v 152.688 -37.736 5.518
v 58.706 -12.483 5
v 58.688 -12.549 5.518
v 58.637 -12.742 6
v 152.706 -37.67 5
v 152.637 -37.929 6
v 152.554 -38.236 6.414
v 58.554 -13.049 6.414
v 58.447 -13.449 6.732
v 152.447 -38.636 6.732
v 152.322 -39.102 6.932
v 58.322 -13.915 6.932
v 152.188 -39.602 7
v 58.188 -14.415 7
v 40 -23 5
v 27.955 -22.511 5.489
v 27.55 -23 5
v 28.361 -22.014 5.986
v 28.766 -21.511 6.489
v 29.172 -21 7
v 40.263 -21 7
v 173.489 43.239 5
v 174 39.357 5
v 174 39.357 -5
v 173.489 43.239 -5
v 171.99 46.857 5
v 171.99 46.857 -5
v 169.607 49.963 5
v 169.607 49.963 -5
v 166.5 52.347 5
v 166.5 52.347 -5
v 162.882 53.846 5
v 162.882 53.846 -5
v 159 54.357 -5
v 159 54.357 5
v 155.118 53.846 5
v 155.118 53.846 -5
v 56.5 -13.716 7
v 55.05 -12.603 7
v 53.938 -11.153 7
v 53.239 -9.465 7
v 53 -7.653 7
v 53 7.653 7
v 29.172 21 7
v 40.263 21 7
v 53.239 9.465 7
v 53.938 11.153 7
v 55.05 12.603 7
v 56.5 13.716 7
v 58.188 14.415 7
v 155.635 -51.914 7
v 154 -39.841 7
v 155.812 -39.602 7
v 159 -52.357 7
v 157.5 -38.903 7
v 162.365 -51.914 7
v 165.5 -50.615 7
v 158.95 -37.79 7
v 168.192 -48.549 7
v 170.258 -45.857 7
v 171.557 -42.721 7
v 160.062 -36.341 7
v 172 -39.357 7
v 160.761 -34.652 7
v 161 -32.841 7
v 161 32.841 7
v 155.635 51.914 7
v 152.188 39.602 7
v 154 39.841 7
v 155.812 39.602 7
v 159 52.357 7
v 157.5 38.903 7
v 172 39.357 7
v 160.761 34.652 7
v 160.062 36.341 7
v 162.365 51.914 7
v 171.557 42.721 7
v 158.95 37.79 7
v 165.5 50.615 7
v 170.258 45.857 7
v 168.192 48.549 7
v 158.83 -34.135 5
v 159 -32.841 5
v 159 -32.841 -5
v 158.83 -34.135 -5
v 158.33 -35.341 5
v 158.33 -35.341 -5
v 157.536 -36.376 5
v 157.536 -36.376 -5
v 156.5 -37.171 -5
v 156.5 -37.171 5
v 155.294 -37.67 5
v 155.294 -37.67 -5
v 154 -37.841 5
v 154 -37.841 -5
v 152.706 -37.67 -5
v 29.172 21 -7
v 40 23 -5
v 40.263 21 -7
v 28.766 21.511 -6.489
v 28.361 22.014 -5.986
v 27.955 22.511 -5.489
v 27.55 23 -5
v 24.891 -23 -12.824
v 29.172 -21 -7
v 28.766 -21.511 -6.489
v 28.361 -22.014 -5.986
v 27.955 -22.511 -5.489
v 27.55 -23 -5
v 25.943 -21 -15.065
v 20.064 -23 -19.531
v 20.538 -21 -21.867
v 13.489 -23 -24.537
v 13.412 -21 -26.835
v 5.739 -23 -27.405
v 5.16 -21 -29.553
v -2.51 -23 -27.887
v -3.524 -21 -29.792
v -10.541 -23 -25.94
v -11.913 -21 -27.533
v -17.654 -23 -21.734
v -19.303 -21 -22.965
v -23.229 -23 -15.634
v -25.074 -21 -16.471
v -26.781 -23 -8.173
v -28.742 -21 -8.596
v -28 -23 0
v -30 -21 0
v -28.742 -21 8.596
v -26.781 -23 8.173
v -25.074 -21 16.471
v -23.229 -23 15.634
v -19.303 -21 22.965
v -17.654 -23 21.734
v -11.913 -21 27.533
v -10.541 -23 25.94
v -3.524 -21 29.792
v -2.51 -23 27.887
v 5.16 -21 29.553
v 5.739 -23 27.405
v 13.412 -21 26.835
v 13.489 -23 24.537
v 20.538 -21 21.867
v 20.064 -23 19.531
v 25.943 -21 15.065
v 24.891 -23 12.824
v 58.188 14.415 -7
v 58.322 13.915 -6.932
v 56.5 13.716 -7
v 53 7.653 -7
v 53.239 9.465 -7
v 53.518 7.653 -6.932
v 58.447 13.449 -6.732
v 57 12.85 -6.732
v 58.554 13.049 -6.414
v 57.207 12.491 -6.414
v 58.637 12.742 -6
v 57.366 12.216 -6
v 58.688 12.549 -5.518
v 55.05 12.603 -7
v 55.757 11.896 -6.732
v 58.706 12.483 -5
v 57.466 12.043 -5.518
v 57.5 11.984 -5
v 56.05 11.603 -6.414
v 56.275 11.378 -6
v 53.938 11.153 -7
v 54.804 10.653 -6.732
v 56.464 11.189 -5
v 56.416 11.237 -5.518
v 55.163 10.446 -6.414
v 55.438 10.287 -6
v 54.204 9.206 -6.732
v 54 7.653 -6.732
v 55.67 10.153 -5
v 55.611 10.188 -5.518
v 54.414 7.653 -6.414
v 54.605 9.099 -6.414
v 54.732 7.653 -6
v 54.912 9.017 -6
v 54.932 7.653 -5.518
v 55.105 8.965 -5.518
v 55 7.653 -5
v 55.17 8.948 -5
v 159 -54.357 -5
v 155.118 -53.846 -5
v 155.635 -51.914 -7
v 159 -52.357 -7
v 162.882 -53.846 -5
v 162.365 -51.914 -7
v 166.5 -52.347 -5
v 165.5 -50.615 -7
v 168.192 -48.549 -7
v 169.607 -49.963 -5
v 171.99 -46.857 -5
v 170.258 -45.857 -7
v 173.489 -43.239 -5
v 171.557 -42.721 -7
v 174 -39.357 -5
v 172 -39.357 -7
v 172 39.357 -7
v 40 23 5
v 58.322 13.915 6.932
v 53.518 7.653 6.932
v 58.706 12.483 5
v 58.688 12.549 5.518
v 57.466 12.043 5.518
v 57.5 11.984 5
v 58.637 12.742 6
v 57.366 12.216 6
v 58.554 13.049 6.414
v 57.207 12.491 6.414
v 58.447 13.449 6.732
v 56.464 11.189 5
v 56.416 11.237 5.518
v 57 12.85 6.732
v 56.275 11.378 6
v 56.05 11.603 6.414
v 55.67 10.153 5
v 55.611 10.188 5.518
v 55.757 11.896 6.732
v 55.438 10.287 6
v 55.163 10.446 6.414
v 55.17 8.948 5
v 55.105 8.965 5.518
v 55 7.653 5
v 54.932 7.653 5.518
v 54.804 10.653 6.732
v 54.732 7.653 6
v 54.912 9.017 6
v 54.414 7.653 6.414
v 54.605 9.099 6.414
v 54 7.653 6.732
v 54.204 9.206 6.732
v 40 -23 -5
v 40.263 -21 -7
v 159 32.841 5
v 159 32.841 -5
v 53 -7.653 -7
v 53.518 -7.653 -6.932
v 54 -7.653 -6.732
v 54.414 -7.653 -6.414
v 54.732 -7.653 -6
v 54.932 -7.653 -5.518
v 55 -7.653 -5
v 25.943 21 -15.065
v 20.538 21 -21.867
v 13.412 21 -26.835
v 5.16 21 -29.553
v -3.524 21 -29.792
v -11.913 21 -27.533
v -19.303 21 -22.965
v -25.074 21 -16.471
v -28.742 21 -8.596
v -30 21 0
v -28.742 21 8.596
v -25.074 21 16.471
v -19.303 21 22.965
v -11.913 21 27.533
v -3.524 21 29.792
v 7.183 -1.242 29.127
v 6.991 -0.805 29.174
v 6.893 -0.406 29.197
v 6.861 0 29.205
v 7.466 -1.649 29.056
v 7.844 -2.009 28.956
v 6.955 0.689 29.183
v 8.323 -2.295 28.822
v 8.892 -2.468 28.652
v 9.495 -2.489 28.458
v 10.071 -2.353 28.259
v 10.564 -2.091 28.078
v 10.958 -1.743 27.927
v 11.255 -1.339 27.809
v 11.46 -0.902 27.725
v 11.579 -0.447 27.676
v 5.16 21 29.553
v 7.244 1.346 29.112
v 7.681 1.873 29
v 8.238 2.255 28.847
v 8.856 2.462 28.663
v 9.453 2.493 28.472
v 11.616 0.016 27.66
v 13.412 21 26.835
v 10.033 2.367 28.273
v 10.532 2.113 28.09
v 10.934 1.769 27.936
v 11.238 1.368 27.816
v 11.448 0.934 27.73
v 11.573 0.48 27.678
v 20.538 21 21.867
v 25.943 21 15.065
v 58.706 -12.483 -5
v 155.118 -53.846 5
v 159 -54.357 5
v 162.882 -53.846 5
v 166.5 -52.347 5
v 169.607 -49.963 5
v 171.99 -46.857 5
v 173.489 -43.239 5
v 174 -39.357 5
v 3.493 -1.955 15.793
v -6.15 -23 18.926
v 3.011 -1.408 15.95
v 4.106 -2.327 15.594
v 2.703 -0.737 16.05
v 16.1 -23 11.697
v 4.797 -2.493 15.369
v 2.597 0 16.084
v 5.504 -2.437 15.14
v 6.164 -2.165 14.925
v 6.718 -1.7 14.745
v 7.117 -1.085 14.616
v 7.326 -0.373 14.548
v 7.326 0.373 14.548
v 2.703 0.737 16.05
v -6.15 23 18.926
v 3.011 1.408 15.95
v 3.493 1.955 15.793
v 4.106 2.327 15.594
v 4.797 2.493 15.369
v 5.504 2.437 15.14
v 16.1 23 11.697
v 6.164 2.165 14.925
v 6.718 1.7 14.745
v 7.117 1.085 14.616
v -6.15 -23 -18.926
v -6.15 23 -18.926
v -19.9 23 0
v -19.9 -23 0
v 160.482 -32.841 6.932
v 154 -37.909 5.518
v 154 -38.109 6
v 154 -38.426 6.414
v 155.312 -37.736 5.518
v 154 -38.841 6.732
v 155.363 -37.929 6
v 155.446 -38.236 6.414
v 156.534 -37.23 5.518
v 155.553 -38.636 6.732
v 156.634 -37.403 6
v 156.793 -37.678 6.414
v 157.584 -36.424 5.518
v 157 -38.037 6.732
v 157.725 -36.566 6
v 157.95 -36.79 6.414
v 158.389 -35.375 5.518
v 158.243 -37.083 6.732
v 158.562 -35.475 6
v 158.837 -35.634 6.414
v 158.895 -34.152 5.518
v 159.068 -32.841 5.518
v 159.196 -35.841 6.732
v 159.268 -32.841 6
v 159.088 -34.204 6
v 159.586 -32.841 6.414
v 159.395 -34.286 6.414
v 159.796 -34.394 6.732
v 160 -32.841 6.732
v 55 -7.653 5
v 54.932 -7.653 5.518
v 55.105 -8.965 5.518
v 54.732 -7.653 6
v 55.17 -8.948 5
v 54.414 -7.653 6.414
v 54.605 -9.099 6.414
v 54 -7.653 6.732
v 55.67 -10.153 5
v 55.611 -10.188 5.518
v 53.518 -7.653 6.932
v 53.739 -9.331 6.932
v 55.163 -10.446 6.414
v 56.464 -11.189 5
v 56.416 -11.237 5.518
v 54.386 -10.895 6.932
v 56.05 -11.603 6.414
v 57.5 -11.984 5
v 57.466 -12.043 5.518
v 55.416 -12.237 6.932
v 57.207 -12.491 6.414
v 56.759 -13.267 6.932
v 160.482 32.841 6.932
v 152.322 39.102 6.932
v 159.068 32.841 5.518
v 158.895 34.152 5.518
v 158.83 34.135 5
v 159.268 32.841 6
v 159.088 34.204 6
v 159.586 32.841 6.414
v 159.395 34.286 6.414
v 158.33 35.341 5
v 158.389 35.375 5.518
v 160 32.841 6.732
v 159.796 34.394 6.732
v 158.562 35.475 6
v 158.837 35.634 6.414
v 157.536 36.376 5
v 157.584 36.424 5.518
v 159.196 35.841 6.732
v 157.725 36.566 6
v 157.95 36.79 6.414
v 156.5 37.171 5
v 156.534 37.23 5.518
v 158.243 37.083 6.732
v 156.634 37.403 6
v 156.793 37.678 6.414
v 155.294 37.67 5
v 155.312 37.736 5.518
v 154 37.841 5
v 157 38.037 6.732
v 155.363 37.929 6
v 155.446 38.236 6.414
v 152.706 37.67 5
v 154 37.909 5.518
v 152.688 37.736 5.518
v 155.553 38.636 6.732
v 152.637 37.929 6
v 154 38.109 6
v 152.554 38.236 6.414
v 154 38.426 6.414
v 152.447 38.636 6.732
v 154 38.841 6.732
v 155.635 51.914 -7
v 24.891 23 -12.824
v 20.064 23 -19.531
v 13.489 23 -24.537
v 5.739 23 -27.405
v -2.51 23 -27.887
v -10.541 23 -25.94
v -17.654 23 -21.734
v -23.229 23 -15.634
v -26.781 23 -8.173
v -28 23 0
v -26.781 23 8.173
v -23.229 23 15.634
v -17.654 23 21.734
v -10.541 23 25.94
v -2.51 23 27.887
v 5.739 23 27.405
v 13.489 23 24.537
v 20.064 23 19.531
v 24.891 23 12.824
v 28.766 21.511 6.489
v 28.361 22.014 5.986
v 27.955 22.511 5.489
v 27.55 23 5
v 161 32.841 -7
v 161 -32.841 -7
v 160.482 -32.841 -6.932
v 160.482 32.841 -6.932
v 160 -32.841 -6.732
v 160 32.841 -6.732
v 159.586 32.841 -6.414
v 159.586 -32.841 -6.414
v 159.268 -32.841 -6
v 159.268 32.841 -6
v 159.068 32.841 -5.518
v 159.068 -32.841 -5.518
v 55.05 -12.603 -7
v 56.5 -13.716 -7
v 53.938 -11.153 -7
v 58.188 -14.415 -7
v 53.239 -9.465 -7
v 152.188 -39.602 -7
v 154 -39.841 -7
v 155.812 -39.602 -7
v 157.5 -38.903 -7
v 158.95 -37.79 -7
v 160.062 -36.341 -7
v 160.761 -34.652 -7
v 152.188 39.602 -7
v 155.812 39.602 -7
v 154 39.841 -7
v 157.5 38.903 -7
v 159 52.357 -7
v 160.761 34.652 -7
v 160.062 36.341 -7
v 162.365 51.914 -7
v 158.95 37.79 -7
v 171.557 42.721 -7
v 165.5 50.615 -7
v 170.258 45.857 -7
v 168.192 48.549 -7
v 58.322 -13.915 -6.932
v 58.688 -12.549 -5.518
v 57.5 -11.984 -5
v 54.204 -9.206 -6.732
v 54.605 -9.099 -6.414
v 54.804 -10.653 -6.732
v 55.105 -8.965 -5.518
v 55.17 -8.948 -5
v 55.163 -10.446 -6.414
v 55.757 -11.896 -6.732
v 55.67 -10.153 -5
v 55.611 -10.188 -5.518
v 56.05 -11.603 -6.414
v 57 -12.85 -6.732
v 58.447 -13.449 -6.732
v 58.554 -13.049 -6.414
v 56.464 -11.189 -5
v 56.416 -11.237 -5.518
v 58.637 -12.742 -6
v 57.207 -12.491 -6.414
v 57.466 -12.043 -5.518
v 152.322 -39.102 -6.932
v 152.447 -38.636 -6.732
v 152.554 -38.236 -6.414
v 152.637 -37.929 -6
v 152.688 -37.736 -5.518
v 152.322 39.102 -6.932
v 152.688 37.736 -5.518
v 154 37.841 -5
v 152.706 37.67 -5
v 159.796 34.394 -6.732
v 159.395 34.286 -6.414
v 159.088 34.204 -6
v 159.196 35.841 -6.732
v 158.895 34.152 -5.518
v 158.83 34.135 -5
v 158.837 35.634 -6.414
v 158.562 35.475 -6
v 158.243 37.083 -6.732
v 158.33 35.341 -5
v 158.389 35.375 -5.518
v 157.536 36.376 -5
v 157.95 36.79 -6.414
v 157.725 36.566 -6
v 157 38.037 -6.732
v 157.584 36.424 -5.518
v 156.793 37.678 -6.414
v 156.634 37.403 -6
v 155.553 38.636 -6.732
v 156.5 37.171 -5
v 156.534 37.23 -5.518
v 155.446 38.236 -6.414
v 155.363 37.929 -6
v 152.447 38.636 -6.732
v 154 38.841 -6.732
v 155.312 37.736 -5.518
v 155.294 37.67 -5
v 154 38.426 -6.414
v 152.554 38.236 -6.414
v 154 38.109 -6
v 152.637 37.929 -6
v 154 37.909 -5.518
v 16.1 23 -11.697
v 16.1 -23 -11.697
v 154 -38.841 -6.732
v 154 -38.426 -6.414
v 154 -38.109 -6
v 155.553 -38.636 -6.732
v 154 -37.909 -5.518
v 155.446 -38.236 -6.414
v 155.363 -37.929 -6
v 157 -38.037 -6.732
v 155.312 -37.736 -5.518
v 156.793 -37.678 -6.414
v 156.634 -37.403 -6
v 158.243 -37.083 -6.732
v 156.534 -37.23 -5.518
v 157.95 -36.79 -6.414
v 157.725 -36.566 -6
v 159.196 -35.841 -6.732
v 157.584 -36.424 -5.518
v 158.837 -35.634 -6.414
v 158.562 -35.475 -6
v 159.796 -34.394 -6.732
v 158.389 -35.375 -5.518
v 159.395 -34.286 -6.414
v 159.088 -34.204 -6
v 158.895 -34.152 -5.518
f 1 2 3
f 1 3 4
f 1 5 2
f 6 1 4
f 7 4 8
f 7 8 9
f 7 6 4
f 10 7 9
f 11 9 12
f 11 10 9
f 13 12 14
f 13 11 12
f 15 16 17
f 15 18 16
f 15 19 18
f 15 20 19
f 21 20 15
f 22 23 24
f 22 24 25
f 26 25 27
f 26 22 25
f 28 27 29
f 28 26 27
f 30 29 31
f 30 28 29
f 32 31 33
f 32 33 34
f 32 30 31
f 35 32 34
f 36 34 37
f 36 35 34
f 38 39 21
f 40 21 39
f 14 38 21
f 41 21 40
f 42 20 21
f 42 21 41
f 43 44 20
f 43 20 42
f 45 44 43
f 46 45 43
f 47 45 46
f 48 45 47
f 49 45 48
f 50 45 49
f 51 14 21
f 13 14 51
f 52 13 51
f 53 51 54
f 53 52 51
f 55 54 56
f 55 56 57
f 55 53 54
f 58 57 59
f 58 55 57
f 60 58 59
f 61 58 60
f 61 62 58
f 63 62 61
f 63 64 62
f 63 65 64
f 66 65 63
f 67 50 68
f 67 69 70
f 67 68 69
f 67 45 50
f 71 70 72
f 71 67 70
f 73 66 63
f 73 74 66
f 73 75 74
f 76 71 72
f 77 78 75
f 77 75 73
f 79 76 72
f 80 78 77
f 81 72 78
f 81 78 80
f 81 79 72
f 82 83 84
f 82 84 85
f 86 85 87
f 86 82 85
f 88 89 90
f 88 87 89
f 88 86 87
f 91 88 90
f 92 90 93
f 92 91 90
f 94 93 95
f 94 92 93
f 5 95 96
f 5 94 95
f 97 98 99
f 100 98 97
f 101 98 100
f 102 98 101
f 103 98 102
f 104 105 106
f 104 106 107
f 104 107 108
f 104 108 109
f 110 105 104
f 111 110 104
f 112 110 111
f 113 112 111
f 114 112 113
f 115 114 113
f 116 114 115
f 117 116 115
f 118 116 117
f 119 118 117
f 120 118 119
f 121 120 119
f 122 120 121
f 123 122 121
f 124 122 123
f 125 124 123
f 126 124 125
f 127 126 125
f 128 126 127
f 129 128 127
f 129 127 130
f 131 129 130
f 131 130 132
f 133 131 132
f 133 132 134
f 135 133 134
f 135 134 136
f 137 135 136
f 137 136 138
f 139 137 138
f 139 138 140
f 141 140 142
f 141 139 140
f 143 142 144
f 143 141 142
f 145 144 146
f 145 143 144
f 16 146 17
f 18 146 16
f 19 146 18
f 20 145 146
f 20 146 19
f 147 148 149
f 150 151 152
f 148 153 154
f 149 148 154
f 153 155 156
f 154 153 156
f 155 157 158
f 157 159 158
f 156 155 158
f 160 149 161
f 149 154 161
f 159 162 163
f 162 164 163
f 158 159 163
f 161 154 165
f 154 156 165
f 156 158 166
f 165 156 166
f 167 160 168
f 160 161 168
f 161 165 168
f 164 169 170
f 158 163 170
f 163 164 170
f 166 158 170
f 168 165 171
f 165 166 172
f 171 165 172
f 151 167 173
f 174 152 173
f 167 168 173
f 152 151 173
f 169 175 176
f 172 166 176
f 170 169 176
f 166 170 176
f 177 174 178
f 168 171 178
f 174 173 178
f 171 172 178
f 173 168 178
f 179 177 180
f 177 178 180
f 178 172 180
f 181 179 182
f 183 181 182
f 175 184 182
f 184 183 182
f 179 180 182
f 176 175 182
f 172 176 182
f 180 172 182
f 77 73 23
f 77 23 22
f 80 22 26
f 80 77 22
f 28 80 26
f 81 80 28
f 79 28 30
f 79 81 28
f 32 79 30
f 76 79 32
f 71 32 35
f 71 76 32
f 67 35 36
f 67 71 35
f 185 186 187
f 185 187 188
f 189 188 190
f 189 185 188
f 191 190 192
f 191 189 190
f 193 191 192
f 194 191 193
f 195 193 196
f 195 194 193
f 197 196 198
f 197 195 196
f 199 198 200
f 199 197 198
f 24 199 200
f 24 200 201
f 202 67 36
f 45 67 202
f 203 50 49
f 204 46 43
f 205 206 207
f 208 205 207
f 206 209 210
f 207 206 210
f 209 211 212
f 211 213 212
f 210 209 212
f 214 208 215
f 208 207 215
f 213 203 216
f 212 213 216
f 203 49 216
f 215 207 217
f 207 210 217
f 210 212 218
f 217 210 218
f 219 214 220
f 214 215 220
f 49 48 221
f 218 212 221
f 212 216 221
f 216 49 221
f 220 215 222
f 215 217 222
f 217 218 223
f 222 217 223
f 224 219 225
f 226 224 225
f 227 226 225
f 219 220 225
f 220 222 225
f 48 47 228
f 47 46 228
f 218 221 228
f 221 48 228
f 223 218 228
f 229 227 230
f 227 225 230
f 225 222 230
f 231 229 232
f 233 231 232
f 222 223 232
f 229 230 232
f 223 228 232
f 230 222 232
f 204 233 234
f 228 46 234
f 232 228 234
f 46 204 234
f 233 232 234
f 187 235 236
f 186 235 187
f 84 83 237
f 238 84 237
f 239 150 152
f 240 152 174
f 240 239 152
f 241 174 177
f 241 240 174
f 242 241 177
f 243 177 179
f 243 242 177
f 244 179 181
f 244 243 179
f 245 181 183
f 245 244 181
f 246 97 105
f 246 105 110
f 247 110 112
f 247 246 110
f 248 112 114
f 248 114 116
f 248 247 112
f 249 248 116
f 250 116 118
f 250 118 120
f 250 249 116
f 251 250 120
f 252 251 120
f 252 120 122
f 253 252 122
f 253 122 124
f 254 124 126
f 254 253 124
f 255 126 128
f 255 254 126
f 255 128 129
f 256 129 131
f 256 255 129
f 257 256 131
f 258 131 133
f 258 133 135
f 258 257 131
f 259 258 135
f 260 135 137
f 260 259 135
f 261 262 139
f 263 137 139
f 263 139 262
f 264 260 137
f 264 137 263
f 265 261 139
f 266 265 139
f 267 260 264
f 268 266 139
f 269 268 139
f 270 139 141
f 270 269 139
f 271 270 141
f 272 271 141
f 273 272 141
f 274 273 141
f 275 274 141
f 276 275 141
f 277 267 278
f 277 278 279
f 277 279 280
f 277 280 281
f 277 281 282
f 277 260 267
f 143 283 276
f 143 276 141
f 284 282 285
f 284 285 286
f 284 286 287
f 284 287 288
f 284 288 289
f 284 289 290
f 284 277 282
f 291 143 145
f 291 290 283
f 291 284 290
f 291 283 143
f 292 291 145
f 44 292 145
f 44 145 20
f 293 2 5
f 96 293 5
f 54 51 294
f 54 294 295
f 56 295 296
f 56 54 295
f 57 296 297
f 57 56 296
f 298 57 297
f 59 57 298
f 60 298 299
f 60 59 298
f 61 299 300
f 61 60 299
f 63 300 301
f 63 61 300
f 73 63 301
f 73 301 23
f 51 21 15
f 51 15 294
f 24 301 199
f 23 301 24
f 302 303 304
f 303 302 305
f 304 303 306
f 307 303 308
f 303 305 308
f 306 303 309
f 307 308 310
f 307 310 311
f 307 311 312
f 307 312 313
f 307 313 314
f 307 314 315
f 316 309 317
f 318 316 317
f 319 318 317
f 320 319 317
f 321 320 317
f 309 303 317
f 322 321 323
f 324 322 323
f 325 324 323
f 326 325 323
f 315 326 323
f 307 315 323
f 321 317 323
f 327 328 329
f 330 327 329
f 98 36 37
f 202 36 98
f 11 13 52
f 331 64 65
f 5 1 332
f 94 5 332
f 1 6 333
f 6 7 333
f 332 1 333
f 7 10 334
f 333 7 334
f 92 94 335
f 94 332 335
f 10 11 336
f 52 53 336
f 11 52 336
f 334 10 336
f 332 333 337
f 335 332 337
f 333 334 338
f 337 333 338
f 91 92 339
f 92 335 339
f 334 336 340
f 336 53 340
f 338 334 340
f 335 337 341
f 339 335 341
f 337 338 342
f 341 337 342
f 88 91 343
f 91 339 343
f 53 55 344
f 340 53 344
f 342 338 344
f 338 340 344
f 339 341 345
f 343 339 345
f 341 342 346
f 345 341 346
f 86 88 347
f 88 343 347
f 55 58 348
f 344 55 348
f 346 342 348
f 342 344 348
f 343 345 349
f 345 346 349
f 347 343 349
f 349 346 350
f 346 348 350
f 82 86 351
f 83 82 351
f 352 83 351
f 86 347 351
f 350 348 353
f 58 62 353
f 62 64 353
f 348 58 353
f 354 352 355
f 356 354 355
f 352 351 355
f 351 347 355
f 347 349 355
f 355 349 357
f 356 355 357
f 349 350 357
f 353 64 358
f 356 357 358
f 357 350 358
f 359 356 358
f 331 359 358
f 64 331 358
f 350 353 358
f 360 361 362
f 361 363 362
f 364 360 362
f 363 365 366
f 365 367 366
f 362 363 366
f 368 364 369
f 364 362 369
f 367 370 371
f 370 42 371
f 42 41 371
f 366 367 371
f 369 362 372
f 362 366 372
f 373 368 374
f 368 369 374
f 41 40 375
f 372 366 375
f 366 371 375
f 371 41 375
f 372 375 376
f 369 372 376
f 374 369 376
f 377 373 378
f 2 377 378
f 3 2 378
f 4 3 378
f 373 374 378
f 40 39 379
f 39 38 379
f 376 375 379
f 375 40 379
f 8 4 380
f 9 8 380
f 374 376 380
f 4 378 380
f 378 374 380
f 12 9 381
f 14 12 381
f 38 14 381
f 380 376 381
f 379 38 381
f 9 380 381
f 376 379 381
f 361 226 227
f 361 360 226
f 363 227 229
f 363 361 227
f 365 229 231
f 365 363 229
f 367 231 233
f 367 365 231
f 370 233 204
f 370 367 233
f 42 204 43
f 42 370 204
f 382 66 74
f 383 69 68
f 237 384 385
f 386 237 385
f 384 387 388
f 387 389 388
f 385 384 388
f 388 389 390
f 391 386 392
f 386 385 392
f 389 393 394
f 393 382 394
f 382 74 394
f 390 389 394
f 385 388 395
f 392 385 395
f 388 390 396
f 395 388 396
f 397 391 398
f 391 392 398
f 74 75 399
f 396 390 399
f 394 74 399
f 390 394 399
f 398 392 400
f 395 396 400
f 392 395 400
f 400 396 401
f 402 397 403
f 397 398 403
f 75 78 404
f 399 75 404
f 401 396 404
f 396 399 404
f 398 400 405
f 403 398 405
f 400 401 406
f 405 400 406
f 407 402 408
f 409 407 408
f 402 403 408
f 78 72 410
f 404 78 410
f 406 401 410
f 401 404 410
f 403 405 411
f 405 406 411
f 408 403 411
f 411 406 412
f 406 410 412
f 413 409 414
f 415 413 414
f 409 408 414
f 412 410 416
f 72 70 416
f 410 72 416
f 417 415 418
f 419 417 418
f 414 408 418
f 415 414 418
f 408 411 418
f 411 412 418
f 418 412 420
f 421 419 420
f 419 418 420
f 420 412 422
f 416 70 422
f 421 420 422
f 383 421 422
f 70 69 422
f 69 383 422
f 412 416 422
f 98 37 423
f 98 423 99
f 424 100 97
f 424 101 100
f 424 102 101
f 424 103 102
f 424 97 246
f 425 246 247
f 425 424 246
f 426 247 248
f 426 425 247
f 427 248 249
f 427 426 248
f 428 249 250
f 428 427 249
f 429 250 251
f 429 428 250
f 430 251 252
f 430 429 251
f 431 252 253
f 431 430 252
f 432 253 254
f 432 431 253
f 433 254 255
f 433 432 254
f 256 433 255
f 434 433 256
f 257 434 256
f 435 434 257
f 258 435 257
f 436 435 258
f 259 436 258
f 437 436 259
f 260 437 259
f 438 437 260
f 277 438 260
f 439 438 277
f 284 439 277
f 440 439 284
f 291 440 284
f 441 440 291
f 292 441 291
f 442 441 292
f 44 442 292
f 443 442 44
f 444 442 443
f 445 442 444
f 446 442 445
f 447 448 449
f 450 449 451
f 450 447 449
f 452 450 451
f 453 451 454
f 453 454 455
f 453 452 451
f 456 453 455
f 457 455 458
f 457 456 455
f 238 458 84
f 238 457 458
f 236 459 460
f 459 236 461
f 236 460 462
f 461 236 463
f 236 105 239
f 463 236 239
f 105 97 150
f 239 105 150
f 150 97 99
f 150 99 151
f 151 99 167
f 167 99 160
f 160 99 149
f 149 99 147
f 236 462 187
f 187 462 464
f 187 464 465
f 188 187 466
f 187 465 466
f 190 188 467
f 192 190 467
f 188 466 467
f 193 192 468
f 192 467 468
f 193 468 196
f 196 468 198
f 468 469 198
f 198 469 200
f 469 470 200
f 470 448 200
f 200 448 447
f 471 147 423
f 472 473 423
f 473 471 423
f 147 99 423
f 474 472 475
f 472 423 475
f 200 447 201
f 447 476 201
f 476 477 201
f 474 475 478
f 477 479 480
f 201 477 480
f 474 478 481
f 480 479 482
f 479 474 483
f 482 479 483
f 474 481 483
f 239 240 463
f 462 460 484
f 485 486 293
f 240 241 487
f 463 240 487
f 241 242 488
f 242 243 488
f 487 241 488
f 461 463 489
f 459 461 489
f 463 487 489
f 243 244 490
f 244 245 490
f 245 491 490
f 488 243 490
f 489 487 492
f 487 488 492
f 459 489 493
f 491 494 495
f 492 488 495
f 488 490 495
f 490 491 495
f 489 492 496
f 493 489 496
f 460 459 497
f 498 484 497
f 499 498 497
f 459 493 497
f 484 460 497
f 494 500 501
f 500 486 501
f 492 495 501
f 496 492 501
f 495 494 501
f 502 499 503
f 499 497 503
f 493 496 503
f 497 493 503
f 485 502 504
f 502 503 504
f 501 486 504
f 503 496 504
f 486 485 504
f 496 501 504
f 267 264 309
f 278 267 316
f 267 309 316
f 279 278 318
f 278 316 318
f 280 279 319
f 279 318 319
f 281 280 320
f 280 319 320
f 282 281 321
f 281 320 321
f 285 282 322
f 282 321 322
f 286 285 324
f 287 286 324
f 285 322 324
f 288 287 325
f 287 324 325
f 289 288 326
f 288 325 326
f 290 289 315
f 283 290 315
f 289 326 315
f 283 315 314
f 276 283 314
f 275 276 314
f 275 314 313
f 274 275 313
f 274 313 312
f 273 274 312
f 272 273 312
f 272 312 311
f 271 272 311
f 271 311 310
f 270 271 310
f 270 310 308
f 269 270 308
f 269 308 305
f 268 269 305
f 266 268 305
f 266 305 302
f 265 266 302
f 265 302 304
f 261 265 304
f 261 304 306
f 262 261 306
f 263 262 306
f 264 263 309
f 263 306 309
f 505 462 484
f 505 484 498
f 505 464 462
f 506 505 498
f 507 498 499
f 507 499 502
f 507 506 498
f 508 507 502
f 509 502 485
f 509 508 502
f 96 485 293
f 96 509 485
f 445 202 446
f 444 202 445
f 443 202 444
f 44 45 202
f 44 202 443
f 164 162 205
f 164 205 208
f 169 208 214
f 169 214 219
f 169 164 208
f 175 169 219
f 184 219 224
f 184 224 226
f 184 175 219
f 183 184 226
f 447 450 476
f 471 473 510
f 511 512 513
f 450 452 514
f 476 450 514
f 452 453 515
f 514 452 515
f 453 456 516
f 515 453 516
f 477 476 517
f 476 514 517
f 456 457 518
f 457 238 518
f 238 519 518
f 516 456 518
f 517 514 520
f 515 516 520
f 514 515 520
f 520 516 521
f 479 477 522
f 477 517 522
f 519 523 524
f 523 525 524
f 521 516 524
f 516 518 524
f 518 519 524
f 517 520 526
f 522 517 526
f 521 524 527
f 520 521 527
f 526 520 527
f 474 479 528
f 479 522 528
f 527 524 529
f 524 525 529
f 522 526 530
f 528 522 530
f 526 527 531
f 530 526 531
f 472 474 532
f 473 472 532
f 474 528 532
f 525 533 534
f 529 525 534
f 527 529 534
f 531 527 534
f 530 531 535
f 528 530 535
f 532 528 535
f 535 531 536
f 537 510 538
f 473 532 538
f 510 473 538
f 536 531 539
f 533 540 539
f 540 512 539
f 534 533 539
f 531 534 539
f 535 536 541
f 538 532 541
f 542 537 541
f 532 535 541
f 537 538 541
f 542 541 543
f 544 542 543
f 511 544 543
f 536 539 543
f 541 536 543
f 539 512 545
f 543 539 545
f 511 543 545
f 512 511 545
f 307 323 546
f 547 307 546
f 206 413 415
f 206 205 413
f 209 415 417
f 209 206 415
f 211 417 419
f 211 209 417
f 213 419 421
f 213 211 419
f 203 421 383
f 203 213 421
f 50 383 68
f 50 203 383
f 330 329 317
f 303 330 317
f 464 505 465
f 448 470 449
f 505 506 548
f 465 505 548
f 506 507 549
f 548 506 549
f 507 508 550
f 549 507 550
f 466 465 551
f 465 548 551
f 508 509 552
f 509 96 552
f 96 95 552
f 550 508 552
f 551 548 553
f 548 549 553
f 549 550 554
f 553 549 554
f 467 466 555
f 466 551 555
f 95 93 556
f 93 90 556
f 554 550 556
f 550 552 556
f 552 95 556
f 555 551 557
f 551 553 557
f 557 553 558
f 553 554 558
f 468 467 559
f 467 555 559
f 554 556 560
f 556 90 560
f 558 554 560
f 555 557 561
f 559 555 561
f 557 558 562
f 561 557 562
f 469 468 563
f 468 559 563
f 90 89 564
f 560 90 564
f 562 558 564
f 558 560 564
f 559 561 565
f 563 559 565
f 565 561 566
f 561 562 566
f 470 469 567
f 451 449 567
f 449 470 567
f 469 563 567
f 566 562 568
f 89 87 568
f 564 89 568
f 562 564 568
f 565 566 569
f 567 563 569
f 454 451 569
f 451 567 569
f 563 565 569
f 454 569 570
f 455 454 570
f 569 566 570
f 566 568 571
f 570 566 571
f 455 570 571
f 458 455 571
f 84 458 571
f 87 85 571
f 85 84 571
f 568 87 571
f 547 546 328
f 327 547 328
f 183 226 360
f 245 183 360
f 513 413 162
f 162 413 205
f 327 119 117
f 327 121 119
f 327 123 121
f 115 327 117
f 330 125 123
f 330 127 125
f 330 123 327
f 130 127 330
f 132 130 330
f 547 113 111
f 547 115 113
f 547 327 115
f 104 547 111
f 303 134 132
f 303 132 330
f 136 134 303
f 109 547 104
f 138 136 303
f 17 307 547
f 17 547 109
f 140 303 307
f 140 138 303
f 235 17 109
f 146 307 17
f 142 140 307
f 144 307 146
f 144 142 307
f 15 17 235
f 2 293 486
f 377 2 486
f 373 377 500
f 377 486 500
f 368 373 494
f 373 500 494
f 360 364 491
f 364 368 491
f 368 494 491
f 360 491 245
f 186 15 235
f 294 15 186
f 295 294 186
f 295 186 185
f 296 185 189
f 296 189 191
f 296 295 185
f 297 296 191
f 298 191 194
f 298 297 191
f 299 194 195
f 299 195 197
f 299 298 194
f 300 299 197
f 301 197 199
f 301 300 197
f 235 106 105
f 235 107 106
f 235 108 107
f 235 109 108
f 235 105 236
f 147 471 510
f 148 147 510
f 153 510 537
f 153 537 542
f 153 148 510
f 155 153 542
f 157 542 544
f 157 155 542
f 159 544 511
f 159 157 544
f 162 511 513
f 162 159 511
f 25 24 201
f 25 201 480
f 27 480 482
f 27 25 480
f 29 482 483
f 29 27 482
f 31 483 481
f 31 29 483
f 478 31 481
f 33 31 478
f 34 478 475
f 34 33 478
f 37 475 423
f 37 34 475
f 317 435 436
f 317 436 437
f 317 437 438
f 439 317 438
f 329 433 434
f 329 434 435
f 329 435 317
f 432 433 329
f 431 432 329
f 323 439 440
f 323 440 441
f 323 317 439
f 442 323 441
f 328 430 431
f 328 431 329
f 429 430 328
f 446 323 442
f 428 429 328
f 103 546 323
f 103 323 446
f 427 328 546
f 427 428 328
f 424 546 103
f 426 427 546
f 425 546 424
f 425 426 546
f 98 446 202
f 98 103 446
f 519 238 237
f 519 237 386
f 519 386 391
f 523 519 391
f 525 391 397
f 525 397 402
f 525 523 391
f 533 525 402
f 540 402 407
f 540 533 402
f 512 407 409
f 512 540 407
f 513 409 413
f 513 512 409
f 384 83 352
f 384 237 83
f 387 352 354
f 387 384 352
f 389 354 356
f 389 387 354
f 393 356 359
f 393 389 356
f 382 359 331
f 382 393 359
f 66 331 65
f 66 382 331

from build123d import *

# Parameters (mm, degrees)
BOSS_EXTRUDE2_DEPTH     = 7
SKETCH2_R               = 30
BOSS_EXTRUDE4_DEPTH     = 23
CUT_EXTRUDE1_DEPTH      = 46
CUT_EXTRUDE2_REACH      = 185.241
CUT_EXTRUDE2_END_RADIUS = 30
SKETCH4_R               = 2.5
FILLET1_R               = 5
CHAMFER1_SIZE           = 2
FILLET2_R               = 2


with BuildPart() as part:
    # Sketch1 → Boss-Extrude2 (new, symmetric)
    with BuildSketch(Plane.XY):
        with BuildLine():
            Line((174, -39.356811193), (174, 39.356811193))
            ThreePointArc((174, 39.356811193), (168.131421435, 51.257111298), (155.117714323, 53.845698587))
            Line((155.117714323, 53.845698587), (40, 23))
            Line((40, 23), (30, 23))
            Line((30, 23), (0, 23))
            Line((0, 23), (0, -23))
            Line((0, -23), (30, -23))
            Line((30, -23), (40, -23))
            Line((40, -23), (155.117714323, -53.845698587))
            ThreePointArc((155.117714323, -53.845698587), (168.131421435, -51.257111298), (174, -39.356811193))
        make_face()
        Polygon((159, -39.356811193), (159, 39.356811193), (55, 11.49009518), (55, -11.49009518), align=None, mode=Mode.SUBTRACT)
    extrude(amount=BOSS_EXTRUDE2_DEPTH, both=True)

    # Sketch2 → Boss-Extrude4 (add, symmetric)
    with BuildSketch(Plane(origin=(0, 0, 0), x_dir=(1, 0, 0), z_dir=(0, 1, 0))):
        Circle(SKETCH2_R)
    extrude(amount=BOSS_EXTRUDE4_DEPTH, both=True)

    # Sketch3 → Cut-Extrude1 (cut)
    with BuildSketch(Plane(origin=(0, 23, 0), x_dir=(1, 0, 0), z_dir=(0, 1, 0))):
        Polygon((16.099689438, 11.697109064), (-6.149534157, 18.926320036), (-19.900310562, 0), (-6.149534157, -18.926320036), (16.099689438, -11.697109064), align=None)
    extrude(amount=-CUT_EXTRUDE1_DEPTH, mode=Mode.SUBTRACT)

    # Cut-Extrude2: up to this cylinder (the profile starts inside it)
    cut_extrude2_end = Plane(origin=(0, 0, 0), z_dir=(0, -1, 0)) * Cylinder(CUT_EXTRUDE2_END_RADIUS, 431.482, mode=Mode.PRIVATE)
    # Sketch4 → Cut-Extrude2 (cut, up to the surface)
    with BuildSketch(Plane(origin=(4.975077641, 0, 15.31171455), x_dir=(-0.9510565162951536, 0, 0.30901699437494745), z_dir=(-0.3090169943749474, 0, -0.9510565162951535)), mode=Mode.PRIVATE) as cut_extrude2_sk1:
        Circle(SKETCH4_R)
    cut_extrude2_tool1 = extrude(cut_extrude2_sk1.sketch, amount=-CUT_EXTRUDE2_REACH, mode=Mode.PRIVATE) & cut_extrude2_end
    add(cut_extrude2_tool1.solids().sort_by_distance((4.975078, 0, 15.311715))[0], mode=Mode.SUBTRACT)

    # Fillet1
    fillet1_edges = [part.edges().sort_by_distance(p)[0] for p in [
        (55, -11.49009518, 0),
        (159, -39.356811193, 0),
        (159, 39.356811193, 0),
        (55, 11.49009518, 0),
    ]]
    fillet(fillet1_edges, radius=FILLET1_R)

    # Chamfer1
    chamfer1_edges = [part.edges().sort_by_distance(p)[0] for p in [
        (34.585952146, 23, 7),
        (97.558857162, -38.422849294, -7),
        (34.585952146, 23, -7),
        (97.558857162, 38.422849294, -7),
        (168.131421435, 51.257111298, -7),
        (97.558857162, -38.422849294, 7),
        (168.131421435, -51.257111298, 7),
        (174, 0, 7),
        (168.131421435, 51.257111298, 7),
        (34.585952146, -23, -7),
        (34.585952146, -23, 7),
        (-30, -23, 0),
        (-30, 23, 0),
        (97.558857162, 38.422849294, 7),
        (174, 0, -7),
        (168.131421435, -51.257111298, -7),
    ]]
    chamfer(chamfer1_edges, length=CHAMFER1_SIZE)

    # Fillet2
    fillet2_edges = [part.edges().sort_by_distance(p)[0] for p in [
        (105.705904774, -25.076701416, -7),
        (105.705904774, -25.076701416, 7),
        (159, 0, -7),
        (159, 0, 7),
        (105.705904774, 25.076701416, -7),
        (105.705904774, 25.076701416, 7),
        (55, 0, -7),
        (55, 0, 7),
        (157.043807145, -36.80745103, -7),
        (157.043807145, -36.80745103, 7),
        (157.043807145, 36.80745103, -7),
        (157.043807145, 36.80745103, 7),
        (56.033233299, -10.697267385, -7),
        (56.033233299, -10.697267385, 7),
        (56.033233299, 10.697267385, -7),
        (56.033233299, 10.697267385, 7),
    ]]
    fillet(fillet2_edges, radius=FILLET2_R)


solid = part.part
